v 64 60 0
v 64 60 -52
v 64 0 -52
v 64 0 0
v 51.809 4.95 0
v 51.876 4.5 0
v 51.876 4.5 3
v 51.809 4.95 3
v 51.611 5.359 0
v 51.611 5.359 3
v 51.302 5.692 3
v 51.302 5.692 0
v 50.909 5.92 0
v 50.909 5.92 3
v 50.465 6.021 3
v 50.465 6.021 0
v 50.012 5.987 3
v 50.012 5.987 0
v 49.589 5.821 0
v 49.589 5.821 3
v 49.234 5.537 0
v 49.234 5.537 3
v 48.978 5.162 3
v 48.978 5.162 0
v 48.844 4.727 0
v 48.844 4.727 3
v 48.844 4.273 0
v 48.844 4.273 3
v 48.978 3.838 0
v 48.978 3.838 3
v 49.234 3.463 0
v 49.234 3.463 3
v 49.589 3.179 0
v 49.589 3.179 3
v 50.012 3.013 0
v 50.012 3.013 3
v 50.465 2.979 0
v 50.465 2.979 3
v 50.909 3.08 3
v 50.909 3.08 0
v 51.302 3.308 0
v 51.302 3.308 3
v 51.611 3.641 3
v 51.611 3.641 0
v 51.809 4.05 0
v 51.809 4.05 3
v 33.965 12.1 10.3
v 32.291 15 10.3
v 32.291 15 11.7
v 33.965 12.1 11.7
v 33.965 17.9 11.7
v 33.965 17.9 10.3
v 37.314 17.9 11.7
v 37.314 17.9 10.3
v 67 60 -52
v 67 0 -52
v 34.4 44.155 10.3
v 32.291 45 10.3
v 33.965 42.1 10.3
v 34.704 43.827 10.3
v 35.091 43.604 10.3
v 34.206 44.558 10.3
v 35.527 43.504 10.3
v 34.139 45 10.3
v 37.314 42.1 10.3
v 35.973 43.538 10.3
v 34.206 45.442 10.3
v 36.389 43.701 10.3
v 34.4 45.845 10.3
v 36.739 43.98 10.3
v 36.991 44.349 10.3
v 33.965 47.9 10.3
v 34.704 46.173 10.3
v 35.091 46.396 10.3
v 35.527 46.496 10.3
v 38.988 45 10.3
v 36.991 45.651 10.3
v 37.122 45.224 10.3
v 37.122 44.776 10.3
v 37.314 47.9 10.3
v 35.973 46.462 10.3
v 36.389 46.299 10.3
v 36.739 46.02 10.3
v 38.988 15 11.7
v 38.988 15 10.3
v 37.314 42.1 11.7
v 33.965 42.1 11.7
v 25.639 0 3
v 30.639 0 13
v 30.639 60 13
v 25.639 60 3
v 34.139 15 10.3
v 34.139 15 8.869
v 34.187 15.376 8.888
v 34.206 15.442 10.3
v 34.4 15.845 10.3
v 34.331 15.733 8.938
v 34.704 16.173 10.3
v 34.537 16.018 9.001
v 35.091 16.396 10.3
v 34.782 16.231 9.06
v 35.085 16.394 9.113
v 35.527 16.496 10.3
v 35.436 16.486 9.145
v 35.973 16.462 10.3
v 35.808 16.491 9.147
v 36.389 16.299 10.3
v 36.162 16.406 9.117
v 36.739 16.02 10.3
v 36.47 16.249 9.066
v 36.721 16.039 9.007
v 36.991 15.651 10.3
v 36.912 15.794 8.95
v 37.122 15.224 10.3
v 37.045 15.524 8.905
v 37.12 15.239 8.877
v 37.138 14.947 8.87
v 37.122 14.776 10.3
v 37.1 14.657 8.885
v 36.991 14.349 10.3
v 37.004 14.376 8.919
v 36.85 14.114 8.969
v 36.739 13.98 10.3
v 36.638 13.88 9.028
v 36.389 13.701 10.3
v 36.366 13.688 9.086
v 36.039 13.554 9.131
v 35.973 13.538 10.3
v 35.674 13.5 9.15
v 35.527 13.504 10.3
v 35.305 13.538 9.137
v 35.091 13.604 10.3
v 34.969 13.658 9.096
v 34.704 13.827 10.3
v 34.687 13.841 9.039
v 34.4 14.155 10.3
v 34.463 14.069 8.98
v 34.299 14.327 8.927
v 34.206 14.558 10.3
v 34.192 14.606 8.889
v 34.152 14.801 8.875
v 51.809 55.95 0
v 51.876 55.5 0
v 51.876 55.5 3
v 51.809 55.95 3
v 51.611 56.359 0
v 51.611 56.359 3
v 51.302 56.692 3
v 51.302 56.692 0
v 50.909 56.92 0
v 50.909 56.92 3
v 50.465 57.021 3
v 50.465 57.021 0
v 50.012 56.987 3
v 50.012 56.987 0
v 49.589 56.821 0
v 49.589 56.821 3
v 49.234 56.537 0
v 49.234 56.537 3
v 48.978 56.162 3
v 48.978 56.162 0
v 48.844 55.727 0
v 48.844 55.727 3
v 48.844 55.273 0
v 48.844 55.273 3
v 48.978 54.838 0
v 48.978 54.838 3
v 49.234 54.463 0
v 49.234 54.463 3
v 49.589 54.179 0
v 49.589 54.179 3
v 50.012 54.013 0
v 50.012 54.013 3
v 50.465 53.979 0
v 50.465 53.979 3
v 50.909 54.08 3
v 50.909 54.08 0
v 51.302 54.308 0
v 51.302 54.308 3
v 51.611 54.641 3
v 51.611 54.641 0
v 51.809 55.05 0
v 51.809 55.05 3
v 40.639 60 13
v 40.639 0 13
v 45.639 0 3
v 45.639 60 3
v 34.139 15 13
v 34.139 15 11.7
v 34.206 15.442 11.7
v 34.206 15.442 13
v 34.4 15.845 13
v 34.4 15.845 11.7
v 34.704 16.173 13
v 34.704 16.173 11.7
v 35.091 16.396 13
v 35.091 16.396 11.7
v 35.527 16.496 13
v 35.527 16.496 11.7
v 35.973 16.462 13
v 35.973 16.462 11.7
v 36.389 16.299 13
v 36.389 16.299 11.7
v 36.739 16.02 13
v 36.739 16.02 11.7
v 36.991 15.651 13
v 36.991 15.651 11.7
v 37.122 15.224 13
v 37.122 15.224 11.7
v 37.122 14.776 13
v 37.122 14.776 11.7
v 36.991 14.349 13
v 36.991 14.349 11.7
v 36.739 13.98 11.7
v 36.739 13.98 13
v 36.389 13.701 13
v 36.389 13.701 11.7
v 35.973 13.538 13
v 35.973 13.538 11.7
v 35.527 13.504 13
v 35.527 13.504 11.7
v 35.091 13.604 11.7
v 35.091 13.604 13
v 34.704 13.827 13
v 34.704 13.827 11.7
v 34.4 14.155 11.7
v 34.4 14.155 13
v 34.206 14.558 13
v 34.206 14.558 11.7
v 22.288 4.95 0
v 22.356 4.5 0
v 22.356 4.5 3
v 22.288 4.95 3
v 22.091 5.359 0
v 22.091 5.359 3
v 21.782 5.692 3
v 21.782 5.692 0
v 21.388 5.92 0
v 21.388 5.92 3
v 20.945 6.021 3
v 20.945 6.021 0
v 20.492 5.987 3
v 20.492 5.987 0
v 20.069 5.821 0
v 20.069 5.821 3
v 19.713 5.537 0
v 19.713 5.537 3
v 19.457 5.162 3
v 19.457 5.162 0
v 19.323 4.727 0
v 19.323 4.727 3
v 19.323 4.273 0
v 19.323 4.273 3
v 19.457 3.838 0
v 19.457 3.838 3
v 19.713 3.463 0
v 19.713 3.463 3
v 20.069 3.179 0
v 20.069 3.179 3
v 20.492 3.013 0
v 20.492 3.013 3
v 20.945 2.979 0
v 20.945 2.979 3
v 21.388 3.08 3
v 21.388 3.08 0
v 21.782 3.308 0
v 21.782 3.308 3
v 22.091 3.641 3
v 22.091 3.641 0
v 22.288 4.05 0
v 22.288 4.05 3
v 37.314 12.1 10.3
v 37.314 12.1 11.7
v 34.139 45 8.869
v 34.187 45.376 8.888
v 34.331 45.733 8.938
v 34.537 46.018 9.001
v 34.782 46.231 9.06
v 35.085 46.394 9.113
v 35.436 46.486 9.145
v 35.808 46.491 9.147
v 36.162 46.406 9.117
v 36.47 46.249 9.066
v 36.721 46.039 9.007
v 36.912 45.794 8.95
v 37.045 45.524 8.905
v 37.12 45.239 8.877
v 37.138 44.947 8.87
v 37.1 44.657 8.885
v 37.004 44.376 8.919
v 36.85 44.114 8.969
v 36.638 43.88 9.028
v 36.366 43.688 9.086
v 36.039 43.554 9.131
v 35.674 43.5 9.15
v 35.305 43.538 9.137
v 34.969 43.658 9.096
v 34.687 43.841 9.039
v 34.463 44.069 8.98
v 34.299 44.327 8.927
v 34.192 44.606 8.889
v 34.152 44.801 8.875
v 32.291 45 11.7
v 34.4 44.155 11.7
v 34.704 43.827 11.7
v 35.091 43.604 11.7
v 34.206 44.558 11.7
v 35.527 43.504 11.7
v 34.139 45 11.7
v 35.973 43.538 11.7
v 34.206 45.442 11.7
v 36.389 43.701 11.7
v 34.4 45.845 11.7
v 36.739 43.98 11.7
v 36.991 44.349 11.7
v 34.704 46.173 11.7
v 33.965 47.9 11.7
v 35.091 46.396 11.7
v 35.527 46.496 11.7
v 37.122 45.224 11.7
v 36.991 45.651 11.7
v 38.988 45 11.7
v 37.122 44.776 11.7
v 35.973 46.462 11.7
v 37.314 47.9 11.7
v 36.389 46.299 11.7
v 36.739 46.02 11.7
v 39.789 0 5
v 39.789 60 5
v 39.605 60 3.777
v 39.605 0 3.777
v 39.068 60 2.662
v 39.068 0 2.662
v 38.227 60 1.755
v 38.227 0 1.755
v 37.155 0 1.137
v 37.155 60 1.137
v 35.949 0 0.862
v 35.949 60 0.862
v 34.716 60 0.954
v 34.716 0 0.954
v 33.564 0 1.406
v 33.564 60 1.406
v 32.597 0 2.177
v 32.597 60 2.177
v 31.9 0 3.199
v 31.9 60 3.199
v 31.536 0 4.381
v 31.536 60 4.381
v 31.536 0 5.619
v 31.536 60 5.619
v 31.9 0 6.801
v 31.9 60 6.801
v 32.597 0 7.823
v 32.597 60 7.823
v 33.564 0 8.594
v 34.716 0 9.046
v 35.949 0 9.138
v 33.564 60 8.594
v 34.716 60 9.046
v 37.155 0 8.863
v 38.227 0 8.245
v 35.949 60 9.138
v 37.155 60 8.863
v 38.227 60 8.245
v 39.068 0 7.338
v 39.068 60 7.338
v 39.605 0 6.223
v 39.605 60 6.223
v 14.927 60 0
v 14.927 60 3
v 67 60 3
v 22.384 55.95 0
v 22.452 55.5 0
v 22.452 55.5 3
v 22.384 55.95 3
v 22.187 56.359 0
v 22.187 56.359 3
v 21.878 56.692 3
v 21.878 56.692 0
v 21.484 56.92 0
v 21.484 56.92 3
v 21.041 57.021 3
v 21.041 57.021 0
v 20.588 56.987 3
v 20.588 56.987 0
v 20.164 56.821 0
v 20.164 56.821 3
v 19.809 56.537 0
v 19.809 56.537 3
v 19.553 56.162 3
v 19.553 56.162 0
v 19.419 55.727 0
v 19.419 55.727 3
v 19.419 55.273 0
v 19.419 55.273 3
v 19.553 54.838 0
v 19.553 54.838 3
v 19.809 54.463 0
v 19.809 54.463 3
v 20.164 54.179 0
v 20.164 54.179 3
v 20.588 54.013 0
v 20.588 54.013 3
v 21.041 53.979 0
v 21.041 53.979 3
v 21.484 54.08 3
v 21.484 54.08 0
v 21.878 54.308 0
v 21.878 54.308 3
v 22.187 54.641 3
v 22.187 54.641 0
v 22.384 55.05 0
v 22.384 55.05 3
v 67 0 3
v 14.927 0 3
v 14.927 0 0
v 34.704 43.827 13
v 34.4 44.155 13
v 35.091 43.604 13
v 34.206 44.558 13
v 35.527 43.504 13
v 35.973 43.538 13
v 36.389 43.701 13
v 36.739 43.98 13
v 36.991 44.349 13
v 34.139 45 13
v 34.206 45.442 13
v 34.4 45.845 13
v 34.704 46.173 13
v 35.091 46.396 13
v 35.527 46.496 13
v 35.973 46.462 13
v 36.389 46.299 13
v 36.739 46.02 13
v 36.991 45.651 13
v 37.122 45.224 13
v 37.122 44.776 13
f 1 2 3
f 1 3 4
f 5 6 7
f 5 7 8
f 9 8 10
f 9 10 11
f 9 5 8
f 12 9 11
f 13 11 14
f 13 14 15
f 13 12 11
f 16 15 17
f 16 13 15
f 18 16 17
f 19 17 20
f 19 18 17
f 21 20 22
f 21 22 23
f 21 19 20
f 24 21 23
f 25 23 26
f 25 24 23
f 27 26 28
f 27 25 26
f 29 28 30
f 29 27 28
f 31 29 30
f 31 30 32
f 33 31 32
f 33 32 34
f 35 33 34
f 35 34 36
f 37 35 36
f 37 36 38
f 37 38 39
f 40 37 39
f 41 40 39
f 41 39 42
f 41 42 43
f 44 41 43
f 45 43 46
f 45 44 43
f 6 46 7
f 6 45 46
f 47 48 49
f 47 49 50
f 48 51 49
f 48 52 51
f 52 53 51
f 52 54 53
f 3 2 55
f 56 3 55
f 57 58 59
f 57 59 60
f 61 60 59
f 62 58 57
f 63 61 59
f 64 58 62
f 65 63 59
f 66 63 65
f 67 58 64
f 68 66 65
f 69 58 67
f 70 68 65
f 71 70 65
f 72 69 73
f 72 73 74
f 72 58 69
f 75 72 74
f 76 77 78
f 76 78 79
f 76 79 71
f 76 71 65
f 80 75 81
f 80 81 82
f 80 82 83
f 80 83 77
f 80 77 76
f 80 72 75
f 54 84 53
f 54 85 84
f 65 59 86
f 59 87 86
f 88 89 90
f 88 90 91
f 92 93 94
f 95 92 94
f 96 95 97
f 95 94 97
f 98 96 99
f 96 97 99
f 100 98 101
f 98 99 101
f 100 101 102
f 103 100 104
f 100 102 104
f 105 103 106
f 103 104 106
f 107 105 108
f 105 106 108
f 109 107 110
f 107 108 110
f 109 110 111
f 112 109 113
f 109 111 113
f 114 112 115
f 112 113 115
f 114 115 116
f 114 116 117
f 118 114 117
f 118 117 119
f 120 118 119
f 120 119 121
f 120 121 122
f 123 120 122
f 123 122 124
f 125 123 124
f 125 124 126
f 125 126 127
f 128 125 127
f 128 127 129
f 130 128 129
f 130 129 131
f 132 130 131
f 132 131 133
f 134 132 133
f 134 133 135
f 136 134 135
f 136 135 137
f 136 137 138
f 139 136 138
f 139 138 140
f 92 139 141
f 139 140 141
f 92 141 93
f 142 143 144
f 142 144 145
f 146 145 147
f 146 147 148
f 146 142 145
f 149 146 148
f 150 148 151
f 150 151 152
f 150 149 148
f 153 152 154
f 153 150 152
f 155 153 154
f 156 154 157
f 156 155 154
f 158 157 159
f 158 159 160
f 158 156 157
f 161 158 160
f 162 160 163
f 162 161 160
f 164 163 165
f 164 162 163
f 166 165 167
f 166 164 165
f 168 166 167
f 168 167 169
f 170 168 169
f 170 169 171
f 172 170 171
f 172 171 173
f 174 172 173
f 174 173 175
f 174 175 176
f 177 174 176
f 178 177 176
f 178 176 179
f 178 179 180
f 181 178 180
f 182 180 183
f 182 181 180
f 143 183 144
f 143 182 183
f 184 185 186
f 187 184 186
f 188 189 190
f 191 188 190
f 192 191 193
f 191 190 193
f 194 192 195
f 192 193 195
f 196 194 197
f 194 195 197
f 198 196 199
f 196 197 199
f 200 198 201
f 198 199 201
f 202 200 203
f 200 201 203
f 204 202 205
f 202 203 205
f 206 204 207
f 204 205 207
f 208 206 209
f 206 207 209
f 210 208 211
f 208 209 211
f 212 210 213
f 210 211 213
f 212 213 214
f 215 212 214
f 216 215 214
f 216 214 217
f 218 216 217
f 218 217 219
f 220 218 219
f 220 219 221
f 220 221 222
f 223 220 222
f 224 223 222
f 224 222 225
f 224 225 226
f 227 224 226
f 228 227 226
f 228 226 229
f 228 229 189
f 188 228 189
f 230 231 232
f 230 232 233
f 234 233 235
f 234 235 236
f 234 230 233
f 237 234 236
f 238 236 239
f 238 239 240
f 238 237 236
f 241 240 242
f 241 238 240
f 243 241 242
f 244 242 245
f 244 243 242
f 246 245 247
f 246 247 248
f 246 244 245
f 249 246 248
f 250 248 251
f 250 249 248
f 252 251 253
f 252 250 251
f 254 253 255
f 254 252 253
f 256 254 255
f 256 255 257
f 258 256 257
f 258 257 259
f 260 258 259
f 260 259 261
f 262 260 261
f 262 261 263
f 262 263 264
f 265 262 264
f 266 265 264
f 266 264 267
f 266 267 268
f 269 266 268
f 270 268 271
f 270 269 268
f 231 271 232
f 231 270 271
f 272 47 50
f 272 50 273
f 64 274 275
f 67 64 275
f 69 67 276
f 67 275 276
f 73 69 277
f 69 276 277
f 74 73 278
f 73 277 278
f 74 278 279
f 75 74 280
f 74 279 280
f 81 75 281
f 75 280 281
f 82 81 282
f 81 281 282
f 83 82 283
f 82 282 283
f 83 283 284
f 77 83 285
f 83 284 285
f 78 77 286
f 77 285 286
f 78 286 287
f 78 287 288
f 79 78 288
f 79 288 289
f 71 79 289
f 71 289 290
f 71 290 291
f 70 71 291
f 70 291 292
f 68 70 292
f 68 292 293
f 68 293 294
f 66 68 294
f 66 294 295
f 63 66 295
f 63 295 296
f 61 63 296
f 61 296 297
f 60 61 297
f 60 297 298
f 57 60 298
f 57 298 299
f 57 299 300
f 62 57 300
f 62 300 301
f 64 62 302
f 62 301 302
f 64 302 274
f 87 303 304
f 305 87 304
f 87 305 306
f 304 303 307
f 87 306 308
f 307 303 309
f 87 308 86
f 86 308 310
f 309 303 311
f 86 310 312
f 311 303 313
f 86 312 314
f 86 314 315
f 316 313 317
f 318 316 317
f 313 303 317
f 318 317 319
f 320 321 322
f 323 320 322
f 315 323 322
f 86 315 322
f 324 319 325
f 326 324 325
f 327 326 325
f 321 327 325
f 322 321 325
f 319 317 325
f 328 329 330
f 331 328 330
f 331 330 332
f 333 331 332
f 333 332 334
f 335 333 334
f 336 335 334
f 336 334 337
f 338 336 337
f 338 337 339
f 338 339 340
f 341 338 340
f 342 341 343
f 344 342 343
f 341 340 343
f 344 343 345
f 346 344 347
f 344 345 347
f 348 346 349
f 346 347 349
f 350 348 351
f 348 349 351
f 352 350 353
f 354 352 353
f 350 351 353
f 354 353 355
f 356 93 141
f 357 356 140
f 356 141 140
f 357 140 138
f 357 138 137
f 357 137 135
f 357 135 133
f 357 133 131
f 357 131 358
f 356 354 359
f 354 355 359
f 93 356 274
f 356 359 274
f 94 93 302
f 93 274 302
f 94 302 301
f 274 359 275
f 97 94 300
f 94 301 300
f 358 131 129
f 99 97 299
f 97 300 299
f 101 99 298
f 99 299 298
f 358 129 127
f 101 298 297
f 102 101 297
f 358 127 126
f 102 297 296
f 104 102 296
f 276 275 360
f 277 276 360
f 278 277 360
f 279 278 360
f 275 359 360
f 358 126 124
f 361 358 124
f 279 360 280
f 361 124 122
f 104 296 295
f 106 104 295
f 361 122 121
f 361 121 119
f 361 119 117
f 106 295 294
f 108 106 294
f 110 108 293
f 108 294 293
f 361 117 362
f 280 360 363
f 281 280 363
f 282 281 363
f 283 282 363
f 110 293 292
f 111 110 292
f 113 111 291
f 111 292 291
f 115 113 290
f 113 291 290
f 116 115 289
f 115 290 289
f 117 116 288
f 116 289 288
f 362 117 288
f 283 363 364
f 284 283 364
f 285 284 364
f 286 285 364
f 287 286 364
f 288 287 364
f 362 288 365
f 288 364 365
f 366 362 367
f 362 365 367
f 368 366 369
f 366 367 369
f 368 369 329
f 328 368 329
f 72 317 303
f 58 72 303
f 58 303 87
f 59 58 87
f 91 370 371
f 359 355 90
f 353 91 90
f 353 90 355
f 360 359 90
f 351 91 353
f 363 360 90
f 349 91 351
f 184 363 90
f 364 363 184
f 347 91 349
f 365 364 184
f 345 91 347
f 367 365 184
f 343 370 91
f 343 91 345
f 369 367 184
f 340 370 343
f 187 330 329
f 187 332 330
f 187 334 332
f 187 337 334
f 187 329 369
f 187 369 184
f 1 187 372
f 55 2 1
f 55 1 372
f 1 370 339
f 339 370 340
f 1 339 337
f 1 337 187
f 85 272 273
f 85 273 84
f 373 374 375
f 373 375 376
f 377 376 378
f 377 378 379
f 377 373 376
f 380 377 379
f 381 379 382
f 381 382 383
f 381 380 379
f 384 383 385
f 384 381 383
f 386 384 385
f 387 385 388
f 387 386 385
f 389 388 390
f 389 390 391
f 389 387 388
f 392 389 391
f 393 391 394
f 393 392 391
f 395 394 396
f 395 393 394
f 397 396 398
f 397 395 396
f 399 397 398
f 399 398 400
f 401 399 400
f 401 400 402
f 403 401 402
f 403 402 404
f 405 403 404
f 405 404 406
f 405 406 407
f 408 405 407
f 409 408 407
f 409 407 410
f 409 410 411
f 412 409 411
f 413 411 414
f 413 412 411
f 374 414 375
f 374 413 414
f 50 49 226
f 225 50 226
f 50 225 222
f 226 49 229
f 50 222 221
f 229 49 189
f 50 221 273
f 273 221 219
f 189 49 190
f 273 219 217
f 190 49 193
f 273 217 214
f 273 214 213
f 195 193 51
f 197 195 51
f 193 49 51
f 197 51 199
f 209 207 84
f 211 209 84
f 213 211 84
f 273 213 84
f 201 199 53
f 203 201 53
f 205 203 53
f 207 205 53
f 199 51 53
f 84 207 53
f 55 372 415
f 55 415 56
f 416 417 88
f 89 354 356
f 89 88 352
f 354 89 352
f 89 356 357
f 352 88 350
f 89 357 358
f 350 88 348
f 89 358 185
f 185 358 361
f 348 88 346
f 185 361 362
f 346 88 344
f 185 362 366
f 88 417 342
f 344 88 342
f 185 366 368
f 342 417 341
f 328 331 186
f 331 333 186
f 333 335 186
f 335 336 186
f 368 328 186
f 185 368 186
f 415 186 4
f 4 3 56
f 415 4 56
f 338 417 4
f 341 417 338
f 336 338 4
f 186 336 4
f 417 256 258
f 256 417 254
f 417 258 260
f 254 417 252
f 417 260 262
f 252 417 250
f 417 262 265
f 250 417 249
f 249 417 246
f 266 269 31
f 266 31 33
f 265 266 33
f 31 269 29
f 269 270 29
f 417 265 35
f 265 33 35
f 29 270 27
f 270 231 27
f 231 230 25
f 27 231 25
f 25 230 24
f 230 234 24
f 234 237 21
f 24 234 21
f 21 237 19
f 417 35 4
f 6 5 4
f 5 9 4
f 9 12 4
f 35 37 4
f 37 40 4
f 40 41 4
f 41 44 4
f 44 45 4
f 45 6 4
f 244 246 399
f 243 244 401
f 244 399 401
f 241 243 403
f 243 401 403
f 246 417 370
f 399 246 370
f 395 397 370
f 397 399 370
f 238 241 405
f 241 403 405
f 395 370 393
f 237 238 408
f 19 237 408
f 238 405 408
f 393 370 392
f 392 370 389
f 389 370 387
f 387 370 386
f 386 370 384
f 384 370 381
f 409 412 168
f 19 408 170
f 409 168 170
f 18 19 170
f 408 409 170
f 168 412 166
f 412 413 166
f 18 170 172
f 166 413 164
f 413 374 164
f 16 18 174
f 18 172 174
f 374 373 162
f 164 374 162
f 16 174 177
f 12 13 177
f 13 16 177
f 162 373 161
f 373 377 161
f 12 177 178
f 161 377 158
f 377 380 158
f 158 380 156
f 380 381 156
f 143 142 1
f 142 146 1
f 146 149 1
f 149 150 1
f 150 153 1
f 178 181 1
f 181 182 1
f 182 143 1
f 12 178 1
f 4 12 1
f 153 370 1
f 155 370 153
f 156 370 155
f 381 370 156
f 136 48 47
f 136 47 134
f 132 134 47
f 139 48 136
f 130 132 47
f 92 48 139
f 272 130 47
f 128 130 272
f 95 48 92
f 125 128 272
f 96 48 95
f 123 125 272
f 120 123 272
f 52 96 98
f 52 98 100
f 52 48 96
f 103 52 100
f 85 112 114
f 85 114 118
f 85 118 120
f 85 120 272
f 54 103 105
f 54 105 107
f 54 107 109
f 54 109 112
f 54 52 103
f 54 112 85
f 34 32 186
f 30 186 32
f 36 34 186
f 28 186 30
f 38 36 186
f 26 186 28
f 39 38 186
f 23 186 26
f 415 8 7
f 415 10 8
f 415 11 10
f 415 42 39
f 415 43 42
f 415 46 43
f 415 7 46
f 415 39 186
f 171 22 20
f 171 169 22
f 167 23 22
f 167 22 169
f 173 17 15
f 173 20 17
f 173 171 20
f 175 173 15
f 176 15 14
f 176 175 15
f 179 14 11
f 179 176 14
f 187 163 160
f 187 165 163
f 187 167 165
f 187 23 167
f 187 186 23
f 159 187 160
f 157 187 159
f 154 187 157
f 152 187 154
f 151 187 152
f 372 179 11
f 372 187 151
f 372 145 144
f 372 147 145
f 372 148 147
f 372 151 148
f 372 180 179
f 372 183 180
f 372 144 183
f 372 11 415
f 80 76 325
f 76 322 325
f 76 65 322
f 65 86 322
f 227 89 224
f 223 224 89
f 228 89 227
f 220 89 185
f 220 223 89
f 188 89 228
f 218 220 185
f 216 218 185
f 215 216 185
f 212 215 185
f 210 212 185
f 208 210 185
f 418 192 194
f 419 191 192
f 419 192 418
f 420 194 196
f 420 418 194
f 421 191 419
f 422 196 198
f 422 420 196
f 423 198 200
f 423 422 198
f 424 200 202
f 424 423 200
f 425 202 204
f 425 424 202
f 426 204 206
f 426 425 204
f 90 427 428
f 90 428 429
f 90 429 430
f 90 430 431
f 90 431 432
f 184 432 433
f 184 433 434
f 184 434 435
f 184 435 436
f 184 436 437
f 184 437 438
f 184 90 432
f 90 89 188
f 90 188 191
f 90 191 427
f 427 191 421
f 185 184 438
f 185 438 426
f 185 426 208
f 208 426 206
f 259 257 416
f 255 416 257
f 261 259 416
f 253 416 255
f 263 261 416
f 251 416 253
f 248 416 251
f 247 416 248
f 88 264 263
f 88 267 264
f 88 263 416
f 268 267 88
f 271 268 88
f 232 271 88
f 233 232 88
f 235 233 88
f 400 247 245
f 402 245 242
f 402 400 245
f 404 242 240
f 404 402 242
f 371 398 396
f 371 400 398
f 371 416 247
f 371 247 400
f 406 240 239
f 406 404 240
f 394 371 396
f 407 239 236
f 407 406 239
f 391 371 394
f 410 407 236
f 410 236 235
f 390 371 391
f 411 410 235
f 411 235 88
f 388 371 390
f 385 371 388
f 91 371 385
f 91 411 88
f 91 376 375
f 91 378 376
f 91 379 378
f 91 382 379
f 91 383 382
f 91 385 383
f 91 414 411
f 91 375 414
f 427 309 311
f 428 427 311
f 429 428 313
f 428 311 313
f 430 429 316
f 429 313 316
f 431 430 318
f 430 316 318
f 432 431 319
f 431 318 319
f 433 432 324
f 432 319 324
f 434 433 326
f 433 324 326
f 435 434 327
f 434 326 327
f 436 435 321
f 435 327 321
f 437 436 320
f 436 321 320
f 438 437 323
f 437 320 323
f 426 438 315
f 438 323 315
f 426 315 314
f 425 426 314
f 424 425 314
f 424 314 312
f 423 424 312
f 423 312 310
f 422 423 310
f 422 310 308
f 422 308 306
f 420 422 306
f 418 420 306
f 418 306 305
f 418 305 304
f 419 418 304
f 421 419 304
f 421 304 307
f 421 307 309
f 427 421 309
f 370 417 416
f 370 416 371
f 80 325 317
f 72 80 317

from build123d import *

# Parameters (mm, degrees)
SKETCH_1_W          = 45.073019954
SKETCH_1_H          = 60
SKETCH_1_R          = 1.525
EXTRUDE_1_DEPTH     = 3
SKETCH_2_W          = 10
SKETCH_2_H          = 60
EXTRUDE_2_DEPTH     = 10
HOLE_WIZARD_1_D     = 8.3
EXTRUDE_3_DEPTH     = 60
CUT_EXTRUDE_1_DEPTH = 0.7
HOLE_WIZARD_2_D     = 3
HOLE_WIZARD_2_DEPTH = 5
SKETCH_10_W         = 3
SKETCH_10_H         = 52
SKETCH_10_H_2       = 3
SKETCH_10_W_2       = 4
EXTRUDE_4_DEPTH     = 60


with BuildPart() as part:
    # 草图1 → 凸台-拉伸1 (new body)
    with BuildSketch(Plane.XY):
        with Locations((37.463490023, 30)):
            Rectangle(SKETCH_1_W, SKETCH_1_H)
        with Locations((20.831064203, 4.5)):
            Circle(SKETCH_1_R, mode=Mode.SUBTRACT)
        with Locations((50.351484989, 4.5)):
            Circle(SKETCH_1_R, mode=Mode.SUBTRACT)
        with Locations((20.926980046, 55.5)):
            Circle(SKETCH_1_R, mode=Mode.SUBTRACT)
        with Locations((50.351484989, 55.5)):
            Circle(SKETCH_1_R, mode=Mode.SUBTRACT)
    extrude(amount=EXTRUDE_1_DEPTH)

    # 草图2 → 凸台-拉伸2 (add)
    with BuildSketch(Plane.XY.offset(3)):
        with Locations((35.639232517, 30)):
            Rectangle(SKETCH_2_W, SKETCH_2_H)
    extrude(amount=EXTRUDE_2_DEPTH)

    # 孔1 (through all)
    with Locations(Plane(origin=(0, 0, 0), x_dir=(-1, 0, 0), z_dir=(0, -1, 0))):
        with Locations((-35.639232517, -5)):
            Hole(HOLE_WIZARD_1_D / 2)

    # 草图5 → 凸台-拉伸3 (add)
    with BuildSketch(Plane.XZ):
        Polygon((30.639232517, 13), (25.639232517, 3), (30.639232517, 3), align=None)
        Polygon((40.639232517, 13), (45.639232517, 3), (40.639232517, 3), align=None)
    extrude(amount=-EXTRUDE_3_DEPTH)

    # 草图7 → 切除-拉伸1 (cut, symmetric)
    with BuildSketch(Plane.XY.offset(11)):
        Polygon((37.313548298, 12.1), (38.987864079, 15), (37.313548298, 17.9), (33.964916737, 17.9), (32.290600956, 15), (33.964916737, 12.1), align=None)
        Polygon((38.987864079, 45), (37.313548298, 47.9), (33.964916737, 47.9), (32.290600956, 45), (33.964916737, 42.1), (37.313548298, 42.1), align=None)
    extrude(amount=CUT_EXTRUDE_1_DEPTH, both=True, mode=Mode.SUBTRACT)

    # 孔2
    with Locations(Plane.XY.offset(13)):
        with Locations((35.639232517, 45), (35.639232517, 15)):
            Hole(HOLE_WIZARD_2_D / 2, depth=HOLE_WIZARD_2_DEPTH)

    # 草图10 → 凸台-拉伸4 (add)
    with BuildSketch(Plane(origin=(0, 60, 0), x_dir=(1, 0, 0), z_dir=(0, 1, 0))):
        with Locations((65.5, 26)):
            Rectangle(SKETCH_10_W, SKETCH_10_H)
        with Locations((65.5, -1.5)):
            Rectangle(SKETCH_10_W, SKETCH_10_H_2)
        with Locations((62, -1.5)):
            Rectangle(SKETCH_10_W_2, SKETCH_10_H_2)
    extrude(amount=-EXTRUDE_4_DEPTH)


solid = part.part
